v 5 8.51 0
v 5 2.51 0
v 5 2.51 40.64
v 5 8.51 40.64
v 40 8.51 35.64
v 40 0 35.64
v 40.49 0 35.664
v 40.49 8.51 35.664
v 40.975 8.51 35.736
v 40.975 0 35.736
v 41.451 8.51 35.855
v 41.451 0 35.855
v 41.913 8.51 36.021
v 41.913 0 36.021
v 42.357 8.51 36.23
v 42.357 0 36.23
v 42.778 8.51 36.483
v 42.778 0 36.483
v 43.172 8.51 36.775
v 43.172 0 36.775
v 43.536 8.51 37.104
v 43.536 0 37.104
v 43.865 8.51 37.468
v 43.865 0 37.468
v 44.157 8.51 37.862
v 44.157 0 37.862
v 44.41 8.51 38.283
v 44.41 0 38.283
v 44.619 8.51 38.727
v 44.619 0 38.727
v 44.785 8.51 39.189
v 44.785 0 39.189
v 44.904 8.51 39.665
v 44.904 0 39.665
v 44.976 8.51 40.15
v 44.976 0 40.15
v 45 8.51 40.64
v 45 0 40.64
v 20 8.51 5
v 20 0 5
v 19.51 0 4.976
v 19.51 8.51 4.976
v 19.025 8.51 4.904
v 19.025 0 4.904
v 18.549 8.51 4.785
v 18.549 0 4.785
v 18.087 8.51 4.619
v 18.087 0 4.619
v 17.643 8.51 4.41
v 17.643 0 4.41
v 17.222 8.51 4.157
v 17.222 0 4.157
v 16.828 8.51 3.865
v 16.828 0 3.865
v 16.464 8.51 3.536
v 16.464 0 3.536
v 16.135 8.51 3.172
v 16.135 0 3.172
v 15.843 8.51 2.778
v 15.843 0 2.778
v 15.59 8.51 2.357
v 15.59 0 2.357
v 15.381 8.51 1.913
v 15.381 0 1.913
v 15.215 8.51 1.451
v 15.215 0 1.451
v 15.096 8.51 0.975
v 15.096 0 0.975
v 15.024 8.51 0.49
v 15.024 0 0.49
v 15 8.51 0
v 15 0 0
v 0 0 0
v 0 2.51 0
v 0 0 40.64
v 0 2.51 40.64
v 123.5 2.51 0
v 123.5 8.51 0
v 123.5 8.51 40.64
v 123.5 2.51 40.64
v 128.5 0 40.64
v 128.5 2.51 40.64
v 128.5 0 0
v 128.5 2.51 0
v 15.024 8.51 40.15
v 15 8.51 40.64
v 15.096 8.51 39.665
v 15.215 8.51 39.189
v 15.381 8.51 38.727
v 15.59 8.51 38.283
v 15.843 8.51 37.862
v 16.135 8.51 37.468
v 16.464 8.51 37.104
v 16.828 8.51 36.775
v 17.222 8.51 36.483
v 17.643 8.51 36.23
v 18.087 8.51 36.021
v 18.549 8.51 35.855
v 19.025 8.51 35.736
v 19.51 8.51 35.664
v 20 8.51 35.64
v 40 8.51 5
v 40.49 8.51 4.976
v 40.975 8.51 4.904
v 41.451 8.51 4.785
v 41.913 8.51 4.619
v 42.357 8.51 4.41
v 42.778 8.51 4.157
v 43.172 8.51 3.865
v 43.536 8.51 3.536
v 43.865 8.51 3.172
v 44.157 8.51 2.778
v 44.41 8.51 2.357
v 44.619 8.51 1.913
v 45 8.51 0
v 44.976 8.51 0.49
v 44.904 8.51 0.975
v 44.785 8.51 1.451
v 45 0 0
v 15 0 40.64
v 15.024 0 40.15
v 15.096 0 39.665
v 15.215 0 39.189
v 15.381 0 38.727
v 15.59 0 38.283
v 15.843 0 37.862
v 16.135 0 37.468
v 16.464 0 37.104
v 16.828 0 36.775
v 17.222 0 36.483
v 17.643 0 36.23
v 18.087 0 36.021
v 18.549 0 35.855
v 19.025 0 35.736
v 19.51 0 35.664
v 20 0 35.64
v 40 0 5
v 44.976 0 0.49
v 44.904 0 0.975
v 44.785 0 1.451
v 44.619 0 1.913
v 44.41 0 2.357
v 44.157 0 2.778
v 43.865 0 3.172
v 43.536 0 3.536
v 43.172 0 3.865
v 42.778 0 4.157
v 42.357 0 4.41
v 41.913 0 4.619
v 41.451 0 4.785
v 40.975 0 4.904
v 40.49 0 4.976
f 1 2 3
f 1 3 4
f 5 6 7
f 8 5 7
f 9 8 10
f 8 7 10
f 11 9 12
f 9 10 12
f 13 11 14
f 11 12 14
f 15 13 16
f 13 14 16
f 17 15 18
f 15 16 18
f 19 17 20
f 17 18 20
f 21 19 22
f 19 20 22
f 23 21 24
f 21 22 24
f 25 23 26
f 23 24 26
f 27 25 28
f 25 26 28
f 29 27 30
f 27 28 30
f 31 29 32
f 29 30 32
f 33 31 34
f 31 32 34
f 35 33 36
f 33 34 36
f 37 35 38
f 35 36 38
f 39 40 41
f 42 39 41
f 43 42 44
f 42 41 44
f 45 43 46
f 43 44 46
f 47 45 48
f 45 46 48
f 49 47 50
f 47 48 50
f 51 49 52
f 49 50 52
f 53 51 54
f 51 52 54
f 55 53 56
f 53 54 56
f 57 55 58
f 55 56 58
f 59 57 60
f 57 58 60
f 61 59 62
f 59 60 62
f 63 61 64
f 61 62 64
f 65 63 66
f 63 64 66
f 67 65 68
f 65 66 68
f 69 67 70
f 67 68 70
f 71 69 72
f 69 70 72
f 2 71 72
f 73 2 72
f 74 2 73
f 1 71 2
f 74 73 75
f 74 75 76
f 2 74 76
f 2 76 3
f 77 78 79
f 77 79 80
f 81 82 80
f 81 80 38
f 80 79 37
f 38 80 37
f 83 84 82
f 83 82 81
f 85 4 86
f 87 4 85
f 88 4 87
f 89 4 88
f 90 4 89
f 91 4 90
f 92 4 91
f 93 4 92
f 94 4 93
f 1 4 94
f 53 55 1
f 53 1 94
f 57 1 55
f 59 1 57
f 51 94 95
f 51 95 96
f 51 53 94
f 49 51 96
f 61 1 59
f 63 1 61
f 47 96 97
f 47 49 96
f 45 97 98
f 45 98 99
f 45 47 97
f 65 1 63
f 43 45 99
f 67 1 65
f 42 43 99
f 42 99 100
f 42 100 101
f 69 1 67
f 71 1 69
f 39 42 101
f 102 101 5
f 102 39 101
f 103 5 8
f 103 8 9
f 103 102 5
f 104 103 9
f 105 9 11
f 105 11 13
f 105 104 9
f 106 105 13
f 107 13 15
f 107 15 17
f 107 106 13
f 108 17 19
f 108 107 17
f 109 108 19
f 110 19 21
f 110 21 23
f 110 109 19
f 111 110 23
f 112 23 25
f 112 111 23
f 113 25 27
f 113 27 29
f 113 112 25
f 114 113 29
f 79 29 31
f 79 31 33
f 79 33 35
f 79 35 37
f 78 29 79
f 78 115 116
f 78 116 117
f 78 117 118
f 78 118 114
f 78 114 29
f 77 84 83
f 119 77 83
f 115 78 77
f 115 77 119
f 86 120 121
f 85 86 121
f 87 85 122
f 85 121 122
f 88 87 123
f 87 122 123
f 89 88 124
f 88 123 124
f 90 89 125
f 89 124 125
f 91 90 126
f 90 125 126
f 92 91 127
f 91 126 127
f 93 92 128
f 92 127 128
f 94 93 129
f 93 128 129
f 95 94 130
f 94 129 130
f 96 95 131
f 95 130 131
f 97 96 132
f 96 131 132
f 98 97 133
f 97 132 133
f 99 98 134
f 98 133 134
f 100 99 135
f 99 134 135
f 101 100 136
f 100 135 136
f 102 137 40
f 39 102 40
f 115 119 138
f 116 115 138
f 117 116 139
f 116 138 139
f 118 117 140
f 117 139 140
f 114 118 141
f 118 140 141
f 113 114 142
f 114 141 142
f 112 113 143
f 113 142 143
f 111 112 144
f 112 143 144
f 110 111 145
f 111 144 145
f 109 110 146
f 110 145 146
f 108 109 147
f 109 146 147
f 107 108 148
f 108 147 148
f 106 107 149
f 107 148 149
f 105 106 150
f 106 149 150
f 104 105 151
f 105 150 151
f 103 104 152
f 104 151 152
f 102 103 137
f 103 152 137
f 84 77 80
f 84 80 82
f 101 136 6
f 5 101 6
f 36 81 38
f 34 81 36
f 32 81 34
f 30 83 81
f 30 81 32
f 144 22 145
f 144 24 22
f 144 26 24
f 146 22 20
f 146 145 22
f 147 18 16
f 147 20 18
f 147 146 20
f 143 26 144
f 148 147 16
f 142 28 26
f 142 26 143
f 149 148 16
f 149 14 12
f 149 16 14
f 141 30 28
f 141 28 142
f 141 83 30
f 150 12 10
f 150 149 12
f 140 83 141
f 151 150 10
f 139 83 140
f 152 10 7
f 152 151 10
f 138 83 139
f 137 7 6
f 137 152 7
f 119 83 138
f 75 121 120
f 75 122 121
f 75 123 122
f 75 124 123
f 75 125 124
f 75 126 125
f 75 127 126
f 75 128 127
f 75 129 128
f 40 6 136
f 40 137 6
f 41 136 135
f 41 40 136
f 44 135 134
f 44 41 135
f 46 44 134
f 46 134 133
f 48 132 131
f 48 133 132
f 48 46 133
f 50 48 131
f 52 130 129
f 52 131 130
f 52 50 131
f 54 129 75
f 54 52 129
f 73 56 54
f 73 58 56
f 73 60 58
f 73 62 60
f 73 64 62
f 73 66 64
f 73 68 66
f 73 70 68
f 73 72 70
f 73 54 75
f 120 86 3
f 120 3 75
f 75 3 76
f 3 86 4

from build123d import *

# Parameters (mm, degrees)
PAD_DEPTH    = 40.64
POCKET_DEPTH = 21


with BuildPart() as part:
    # Sketch → Pad (new body)
    with BuildSketch(Plane.XY):
        Polygon((0, 0), (0, 2.51), (5, 2.51), (4.999966, 8.51), (123.5, 8.51), (123.5, 2.51), (128.5, 2.51), (128.5, 0), align=None)
    extrude(amount=PAD_DEPTH)

    # Sketch002 → Pocket (cut)
    with BuildSketch(Plane.XZ):
        with BuildLine():
            ThreePointArc((20, 5), (15, 0), (20, -5))
            Line((20, -5), (40, -5))
            ThreePointArc((40, -5), (45, 0), (40, 5))
            Line((40, 5), (20, 5))
        make_face()
        with BuildLine():
            ThreePointArc((20, 45.64), (15, 40.64), (20, 35.64))
            Line((20, 35.64), (40, 35.64))
            ThreePointArc((40, 35.64), (45, 40.64), (40, 45.64))
            Line((40, 45.64), (20, 45.64))
        make_face()
    extrude(amount=-POCKET_DEPTH, mode=Mode.SUBTRACT)


solid = part.part
